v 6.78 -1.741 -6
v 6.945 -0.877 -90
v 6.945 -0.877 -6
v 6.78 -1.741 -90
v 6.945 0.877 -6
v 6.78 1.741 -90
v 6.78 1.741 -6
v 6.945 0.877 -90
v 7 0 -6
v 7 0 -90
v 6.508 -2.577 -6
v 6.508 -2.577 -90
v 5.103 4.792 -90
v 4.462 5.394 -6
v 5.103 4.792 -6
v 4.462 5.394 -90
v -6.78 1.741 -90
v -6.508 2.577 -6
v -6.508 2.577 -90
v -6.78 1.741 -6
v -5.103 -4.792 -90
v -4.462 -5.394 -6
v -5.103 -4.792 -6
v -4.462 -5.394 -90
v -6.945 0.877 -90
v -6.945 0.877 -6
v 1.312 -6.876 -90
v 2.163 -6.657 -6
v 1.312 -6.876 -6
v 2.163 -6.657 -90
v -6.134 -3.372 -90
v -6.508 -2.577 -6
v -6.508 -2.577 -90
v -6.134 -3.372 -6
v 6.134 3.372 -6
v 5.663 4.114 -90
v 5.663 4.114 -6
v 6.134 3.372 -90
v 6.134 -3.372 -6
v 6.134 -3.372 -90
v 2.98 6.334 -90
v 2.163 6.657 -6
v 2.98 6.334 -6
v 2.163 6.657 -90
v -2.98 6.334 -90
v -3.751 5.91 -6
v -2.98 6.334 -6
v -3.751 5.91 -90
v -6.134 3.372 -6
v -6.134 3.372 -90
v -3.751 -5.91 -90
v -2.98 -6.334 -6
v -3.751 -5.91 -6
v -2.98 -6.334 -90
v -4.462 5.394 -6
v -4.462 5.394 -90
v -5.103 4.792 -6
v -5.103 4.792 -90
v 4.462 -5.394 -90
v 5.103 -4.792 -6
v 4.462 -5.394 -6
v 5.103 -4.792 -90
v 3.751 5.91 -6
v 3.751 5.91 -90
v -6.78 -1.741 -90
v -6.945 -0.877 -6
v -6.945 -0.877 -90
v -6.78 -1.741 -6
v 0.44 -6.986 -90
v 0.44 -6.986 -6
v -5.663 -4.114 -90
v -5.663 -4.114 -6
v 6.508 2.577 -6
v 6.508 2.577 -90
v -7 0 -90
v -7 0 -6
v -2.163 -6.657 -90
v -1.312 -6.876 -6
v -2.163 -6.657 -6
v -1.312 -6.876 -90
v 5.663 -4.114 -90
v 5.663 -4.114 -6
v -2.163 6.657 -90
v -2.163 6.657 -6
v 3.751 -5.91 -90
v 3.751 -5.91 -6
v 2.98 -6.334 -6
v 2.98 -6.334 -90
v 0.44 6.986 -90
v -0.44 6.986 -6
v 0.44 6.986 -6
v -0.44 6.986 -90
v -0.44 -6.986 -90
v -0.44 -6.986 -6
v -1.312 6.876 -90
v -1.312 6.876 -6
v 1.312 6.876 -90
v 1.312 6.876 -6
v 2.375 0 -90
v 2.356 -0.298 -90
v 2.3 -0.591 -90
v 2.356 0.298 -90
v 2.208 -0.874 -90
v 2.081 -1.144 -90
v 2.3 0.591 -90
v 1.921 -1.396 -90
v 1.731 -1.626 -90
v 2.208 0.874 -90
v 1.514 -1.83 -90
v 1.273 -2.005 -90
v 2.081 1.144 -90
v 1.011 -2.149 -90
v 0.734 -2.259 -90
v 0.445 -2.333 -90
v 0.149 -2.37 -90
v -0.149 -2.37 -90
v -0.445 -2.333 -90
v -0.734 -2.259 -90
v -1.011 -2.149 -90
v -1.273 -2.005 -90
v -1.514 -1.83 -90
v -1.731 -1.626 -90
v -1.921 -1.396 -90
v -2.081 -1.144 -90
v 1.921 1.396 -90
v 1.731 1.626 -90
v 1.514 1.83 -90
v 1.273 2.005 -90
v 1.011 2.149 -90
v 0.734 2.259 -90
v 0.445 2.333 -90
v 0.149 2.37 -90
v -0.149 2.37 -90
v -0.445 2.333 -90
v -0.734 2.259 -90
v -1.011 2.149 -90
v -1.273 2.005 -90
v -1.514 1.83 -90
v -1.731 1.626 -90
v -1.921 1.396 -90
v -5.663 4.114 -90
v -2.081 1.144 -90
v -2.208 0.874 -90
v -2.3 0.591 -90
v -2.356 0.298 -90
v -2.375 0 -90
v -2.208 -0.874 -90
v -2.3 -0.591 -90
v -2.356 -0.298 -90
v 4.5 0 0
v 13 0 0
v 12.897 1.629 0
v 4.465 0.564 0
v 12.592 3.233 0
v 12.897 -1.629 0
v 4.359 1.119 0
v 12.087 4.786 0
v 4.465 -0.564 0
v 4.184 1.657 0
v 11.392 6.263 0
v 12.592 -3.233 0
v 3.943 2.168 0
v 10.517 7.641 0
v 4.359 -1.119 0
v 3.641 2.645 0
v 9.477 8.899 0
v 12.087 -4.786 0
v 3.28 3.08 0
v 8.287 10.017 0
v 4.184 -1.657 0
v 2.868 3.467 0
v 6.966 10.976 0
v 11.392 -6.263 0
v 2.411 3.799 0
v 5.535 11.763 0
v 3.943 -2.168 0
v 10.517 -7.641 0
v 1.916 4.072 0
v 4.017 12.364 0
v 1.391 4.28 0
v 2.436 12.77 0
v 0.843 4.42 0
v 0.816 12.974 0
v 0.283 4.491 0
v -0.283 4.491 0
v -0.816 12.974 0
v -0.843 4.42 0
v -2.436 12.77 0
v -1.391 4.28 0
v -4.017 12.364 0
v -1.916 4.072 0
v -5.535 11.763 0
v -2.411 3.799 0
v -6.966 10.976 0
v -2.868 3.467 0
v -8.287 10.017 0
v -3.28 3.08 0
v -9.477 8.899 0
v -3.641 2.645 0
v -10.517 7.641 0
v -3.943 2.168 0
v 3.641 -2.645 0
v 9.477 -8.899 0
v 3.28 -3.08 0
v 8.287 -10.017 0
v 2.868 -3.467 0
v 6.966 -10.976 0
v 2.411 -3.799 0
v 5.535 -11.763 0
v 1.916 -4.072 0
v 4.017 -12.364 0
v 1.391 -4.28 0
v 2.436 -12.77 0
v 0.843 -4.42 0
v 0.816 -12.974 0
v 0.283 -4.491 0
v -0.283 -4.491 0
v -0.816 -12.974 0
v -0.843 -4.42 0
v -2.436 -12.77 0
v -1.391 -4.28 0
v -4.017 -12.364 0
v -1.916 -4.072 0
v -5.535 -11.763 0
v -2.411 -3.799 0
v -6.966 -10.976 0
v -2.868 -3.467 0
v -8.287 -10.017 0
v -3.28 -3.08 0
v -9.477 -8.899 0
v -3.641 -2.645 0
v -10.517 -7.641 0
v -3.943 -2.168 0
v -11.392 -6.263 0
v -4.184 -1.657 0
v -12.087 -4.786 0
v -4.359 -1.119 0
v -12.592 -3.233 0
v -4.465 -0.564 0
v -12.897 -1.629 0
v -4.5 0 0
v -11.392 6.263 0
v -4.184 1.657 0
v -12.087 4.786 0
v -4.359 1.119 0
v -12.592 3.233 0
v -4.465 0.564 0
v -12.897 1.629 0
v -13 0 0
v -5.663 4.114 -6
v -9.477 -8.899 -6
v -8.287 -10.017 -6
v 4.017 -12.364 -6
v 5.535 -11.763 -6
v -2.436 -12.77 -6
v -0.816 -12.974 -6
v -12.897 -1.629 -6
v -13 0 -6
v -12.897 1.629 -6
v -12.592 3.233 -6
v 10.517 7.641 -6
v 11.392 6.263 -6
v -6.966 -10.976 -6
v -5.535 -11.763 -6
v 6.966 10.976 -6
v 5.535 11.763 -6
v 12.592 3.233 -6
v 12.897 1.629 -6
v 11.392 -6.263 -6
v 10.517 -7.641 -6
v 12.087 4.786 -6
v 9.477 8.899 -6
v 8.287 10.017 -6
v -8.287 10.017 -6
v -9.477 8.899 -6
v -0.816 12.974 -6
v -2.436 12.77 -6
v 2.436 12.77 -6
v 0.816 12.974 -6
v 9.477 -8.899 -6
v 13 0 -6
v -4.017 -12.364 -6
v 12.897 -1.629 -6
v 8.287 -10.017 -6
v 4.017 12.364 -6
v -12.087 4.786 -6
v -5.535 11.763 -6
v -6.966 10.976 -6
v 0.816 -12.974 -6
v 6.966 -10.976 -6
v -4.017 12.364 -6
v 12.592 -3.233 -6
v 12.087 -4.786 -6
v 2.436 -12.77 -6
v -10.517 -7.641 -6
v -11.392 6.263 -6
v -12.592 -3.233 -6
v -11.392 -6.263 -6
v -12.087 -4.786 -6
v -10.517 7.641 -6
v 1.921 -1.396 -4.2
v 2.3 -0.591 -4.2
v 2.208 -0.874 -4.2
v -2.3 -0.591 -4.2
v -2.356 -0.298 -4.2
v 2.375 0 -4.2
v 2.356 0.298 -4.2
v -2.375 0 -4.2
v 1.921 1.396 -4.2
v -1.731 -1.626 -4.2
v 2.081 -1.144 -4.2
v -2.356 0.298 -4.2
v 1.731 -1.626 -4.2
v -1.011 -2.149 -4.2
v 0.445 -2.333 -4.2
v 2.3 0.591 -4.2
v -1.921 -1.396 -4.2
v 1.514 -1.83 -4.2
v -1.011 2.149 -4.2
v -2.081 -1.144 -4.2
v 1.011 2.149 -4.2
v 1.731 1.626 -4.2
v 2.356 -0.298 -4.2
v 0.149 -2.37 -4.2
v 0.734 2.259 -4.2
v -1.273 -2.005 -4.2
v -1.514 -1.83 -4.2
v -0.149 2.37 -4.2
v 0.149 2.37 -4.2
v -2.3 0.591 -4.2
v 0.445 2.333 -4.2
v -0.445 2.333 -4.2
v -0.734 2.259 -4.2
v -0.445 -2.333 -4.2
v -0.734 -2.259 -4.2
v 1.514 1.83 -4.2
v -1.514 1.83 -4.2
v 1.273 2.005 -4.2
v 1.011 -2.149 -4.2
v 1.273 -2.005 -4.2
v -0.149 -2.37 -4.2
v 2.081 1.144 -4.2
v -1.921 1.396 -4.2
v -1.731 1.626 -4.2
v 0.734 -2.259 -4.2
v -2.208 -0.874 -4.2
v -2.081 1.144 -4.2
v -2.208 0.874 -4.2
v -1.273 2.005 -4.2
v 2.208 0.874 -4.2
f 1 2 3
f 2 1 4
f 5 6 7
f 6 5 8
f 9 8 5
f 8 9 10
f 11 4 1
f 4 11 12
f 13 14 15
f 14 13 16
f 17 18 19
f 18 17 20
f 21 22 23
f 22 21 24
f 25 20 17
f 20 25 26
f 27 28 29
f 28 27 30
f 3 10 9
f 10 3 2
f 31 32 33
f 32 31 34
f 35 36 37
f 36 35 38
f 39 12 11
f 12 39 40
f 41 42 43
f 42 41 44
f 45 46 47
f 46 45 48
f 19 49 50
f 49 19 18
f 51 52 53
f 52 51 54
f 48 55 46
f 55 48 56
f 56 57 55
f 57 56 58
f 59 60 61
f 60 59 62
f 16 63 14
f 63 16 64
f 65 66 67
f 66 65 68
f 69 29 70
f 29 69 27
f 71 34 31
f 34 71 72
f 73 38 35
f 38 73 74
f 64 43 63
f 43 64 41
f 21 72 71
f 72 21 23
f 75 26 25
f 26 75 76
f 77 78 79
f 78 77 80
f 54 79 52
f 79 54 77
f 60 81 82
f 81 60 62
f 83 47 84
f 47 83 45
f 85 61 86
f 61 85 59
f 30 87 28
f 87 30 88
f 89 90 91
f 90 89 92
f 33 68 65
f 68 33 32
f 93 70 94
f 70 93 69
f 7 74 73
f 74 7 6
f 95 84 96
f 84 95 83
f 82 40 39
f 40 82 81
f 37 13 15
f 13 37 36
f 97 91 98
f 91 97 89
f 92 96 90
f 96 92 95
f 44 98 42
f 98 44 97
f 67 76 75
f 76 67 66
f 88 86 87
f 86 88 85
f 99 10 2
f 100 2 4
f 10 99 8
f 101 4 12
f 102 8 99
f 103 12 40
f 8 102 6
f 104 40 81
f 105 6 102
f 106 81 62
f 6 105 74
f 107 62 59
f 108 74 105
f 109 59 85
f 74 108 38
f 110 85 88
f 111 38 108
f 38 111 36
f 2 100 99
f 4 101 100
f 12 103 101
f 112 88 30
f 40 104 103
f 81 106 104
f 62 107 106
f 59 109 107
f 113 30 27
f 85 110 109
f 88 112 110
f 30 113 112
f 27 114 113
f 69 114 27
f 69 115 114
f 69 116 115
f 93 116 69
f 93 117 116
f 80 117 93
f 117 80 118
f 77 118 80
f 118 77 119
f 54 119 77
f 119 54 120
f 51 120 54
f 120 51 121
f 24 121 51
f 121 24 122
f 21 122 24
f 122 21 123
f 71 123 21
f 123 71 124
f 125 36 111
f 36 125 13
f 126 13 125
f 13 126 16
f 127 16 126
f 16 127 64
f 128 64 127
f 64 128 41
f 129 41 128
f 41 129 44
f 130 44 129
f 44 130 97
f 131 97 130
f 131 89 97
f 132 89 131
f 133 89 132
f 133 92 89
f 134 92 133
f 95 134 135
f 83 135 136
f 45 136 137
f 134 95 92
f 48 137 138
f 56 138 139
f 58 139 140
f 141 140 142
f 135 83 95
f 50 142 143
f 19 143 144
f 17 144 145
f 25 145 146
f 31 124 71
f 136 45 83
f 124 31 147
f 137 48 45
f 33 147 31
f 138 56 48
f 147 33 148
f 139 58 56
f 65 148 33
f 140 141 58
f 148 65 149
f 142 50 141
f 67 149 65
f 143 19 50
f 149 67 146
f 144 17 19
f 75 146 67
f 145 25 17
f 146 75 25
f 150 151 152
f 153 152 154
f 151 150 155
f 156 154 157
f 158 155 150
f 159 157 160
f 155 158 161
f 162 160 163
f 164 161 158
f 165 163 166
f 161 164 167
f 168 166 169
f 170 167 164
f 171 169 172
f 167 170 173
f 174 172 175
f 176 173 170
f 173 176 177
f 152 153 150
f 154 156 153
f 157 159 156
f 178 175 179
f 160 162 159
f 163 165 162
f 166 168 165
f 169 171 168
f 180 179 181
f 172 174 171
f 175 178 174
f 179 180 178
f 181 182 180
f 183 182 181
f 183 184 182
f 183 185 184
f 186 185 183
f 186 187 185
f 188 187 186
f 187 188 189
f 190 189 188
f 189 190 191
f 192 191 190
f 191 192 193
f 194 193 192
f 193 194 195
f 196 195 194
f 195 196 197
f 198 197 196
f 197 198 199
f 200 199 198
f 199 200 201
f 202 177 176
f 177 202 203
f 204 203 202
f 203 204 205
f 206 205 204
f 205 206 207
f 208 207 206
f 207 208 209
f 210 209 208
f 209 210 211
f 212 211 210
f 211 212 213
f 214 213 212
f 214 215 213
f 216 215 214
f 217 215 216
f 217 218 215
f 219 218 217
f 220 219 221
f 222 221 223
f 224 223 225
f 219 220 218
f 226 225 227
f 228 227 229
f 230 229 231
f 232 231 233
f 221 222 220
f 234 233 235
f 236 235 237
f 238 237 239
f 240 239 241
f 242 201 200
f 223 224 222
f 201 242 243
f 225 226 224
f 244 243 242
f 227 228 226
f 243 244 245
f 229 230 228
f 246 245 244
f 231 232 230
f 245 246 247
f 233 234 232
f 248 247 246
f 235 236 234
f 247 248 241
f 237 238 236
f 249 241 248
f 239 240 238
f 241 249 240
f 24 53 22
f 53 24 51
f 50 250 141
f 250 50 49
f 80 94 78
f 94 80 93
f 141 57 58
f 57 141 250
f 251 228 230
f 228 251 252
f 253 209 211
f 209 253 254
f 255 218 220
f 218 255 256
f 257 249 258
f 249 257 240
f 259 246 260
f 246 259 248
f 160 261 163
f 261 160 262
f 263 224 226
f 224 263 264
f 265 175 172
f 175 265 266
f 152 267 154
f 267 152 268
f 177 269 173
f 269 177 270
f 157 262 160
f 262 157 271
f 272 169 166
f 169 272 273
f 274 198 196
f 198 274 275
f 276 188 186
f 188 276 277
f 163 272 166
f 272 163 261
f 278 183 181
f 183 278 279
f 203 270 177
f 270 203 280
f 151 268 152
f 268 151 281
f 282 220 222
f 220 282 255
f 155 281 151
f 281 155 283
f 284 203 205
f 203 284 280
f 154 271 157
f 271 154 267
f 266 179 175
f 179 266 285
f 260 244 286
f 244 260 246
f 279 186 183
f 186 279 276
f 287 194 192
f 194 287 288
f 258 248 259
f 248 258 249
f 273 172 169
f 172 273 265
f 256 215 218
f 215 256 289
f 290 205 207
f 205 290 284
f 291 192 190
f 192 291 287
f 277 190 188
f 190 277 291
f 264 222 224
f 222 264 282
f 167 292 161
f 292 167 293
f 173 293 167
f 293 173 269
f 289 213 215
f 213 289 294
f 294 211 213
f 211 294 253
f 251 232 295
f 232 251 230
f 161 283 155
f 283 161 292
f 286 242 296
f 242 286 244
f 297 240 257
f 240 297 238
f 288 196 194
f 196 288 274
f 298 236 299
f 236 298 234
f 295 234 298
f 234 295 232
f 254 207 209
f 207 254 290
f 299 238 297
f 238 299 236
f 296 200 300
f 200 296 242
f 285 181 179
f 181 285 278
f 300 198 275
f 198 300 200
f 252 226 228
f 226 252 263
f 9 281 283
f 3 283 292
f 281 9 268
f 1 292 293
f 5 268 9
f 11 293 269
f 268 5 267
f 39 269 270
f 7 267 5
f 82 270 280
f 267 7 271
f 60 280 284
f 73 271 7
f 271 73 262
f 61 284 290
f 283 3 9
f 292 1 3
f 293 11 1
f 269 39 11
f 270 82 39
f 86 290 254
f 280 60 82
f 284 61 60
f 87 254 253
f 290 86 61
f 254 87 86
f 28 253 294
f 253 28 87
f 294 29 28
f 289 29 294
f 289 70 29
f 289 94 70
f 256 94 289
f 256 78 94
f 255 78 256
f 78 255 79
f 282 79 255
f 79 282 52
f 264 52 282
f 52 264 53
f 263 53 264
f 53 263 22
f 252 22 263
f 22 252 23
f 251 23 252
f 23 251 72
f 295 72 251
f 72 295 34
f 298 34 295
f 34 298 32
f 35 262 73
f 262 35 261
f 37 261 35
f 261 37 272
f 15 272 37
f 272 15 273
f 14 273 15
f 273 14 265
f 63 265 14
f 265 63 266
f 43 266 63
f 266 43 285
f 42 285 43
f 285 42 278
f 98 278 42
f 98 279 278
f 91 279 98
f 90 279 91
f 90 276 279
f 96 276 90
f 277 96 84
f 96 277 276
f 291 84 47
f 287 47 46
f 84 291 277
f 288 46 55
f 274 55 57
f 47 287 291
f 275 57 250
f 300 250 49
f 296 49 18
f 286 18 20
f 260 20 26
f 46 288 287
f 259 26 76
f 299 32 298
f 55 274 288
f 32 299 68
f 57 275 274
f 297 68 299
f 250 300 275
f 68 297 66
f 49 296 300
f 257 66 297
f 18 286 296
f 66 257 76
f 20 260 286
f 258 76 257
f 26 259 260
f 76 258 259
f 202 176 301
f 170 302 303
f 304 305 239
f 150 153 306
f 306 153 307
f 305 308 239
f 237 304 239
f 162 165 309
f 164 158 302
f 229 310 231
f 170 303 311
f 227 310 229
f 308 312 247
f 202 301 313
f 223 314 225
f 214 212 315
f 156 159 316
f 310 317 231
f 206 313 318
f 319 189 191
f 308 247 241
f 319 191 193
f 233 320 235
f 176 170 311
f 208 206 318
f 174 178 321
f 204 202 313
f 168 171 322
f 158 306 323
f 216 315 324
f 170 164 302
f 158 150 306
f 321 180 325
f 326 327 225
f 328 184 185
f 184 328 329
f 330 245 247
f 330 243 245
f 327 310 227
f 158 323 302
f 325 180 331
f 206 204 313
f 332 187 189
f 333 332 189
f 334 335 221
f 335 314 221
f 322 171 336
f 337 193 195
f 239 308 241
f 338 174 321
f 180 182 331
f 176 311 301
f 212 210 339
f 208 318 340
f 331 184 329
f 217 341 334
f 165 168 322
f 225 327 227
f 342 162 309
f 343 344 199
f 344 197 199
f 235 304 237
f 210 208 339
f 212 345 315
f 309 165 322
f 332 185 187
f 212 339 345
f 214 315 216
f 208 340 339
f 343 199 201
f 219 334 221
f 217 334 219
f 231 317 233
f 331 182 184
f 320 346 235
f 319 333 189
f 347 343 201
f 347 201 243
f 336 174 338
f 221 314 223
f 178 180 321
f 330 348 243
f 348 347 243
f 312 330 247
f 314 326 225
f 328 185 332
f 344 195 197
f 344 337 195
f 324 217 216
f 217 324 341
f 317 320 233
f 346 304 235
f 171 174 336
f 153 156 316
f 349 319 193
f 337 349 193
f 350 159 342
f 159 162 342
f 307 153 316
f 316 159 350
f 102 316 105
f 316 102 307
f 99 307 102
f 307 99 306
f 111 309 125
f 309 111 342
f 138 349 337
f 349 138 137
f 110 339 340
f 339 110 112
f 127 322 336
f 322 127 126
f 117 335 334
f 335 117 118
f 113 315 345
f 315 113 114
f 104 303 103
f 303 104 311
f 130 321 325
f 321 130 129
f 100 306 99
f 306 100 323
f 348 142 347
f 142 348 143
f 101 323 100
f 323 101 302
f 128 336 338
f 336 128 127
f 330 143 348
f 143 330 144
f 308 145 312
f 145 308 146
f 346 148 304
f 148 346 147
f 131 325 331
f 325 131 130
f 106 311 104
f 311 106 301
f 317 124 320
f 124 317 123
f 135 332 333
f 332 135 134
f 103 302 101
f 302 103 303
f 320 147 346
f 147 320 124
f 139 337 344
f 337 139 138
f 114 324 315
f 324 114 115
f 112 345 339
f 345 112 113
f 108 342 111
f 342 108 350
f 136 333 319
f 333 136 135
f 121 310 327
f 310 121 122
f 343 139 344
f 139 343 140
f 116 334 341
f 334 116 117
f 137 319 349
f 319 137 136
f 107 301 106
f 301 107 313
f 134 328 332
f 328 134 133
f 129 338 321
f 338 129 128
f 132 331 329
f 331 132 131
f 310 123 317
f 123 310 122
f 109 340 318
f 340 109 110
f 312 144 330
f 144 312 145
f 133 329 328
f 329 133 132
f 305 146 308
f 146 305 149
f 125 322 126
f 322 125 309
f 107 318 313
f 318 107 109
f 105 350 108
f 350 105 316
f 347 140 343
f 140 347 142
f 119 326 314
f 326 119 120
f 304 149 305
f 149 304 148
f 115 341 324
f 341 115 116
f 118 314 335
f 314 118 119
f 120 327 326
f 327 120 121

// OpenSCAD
$fn = 50;


difference() {
	union() {
		translate(v = [0, 0, -90.0000000000]) {
			cylinder(h = 90, r = 7.0000000000);
		}
		translate(v = [0, 0, -6.0000000000]) {
			cylinder(h = 6, r = 13.0000000000);
		}
	}
	union() {
		translate(v = [0, 0, 0]) {
			rotate(a = [0, 0, 0]) {
				difference() {
					union() {
						#translate(v = [0, 0, -90.0000000000]) {
							cylinder(h = 90, r = 2.2500000000);
						}
						#translate(v = [0, 0, -4.2000000000]) {
							cylinder(h = 4.2000000000, r = 7.0000000000, r1 = 2.3750000000, r2 = 4.5000000000);
						}
						#translate(v = [0, 0, -90.0000000000]) {
							cylinder(h = 90, r = 2.3750000000);
						}
						#translate(v = [0, 0, -90.0000000000]) {
							cylinder(h = 90, r = 2.2500000000);
						}
					}
					union();
				}
			}
		}
	}
}
